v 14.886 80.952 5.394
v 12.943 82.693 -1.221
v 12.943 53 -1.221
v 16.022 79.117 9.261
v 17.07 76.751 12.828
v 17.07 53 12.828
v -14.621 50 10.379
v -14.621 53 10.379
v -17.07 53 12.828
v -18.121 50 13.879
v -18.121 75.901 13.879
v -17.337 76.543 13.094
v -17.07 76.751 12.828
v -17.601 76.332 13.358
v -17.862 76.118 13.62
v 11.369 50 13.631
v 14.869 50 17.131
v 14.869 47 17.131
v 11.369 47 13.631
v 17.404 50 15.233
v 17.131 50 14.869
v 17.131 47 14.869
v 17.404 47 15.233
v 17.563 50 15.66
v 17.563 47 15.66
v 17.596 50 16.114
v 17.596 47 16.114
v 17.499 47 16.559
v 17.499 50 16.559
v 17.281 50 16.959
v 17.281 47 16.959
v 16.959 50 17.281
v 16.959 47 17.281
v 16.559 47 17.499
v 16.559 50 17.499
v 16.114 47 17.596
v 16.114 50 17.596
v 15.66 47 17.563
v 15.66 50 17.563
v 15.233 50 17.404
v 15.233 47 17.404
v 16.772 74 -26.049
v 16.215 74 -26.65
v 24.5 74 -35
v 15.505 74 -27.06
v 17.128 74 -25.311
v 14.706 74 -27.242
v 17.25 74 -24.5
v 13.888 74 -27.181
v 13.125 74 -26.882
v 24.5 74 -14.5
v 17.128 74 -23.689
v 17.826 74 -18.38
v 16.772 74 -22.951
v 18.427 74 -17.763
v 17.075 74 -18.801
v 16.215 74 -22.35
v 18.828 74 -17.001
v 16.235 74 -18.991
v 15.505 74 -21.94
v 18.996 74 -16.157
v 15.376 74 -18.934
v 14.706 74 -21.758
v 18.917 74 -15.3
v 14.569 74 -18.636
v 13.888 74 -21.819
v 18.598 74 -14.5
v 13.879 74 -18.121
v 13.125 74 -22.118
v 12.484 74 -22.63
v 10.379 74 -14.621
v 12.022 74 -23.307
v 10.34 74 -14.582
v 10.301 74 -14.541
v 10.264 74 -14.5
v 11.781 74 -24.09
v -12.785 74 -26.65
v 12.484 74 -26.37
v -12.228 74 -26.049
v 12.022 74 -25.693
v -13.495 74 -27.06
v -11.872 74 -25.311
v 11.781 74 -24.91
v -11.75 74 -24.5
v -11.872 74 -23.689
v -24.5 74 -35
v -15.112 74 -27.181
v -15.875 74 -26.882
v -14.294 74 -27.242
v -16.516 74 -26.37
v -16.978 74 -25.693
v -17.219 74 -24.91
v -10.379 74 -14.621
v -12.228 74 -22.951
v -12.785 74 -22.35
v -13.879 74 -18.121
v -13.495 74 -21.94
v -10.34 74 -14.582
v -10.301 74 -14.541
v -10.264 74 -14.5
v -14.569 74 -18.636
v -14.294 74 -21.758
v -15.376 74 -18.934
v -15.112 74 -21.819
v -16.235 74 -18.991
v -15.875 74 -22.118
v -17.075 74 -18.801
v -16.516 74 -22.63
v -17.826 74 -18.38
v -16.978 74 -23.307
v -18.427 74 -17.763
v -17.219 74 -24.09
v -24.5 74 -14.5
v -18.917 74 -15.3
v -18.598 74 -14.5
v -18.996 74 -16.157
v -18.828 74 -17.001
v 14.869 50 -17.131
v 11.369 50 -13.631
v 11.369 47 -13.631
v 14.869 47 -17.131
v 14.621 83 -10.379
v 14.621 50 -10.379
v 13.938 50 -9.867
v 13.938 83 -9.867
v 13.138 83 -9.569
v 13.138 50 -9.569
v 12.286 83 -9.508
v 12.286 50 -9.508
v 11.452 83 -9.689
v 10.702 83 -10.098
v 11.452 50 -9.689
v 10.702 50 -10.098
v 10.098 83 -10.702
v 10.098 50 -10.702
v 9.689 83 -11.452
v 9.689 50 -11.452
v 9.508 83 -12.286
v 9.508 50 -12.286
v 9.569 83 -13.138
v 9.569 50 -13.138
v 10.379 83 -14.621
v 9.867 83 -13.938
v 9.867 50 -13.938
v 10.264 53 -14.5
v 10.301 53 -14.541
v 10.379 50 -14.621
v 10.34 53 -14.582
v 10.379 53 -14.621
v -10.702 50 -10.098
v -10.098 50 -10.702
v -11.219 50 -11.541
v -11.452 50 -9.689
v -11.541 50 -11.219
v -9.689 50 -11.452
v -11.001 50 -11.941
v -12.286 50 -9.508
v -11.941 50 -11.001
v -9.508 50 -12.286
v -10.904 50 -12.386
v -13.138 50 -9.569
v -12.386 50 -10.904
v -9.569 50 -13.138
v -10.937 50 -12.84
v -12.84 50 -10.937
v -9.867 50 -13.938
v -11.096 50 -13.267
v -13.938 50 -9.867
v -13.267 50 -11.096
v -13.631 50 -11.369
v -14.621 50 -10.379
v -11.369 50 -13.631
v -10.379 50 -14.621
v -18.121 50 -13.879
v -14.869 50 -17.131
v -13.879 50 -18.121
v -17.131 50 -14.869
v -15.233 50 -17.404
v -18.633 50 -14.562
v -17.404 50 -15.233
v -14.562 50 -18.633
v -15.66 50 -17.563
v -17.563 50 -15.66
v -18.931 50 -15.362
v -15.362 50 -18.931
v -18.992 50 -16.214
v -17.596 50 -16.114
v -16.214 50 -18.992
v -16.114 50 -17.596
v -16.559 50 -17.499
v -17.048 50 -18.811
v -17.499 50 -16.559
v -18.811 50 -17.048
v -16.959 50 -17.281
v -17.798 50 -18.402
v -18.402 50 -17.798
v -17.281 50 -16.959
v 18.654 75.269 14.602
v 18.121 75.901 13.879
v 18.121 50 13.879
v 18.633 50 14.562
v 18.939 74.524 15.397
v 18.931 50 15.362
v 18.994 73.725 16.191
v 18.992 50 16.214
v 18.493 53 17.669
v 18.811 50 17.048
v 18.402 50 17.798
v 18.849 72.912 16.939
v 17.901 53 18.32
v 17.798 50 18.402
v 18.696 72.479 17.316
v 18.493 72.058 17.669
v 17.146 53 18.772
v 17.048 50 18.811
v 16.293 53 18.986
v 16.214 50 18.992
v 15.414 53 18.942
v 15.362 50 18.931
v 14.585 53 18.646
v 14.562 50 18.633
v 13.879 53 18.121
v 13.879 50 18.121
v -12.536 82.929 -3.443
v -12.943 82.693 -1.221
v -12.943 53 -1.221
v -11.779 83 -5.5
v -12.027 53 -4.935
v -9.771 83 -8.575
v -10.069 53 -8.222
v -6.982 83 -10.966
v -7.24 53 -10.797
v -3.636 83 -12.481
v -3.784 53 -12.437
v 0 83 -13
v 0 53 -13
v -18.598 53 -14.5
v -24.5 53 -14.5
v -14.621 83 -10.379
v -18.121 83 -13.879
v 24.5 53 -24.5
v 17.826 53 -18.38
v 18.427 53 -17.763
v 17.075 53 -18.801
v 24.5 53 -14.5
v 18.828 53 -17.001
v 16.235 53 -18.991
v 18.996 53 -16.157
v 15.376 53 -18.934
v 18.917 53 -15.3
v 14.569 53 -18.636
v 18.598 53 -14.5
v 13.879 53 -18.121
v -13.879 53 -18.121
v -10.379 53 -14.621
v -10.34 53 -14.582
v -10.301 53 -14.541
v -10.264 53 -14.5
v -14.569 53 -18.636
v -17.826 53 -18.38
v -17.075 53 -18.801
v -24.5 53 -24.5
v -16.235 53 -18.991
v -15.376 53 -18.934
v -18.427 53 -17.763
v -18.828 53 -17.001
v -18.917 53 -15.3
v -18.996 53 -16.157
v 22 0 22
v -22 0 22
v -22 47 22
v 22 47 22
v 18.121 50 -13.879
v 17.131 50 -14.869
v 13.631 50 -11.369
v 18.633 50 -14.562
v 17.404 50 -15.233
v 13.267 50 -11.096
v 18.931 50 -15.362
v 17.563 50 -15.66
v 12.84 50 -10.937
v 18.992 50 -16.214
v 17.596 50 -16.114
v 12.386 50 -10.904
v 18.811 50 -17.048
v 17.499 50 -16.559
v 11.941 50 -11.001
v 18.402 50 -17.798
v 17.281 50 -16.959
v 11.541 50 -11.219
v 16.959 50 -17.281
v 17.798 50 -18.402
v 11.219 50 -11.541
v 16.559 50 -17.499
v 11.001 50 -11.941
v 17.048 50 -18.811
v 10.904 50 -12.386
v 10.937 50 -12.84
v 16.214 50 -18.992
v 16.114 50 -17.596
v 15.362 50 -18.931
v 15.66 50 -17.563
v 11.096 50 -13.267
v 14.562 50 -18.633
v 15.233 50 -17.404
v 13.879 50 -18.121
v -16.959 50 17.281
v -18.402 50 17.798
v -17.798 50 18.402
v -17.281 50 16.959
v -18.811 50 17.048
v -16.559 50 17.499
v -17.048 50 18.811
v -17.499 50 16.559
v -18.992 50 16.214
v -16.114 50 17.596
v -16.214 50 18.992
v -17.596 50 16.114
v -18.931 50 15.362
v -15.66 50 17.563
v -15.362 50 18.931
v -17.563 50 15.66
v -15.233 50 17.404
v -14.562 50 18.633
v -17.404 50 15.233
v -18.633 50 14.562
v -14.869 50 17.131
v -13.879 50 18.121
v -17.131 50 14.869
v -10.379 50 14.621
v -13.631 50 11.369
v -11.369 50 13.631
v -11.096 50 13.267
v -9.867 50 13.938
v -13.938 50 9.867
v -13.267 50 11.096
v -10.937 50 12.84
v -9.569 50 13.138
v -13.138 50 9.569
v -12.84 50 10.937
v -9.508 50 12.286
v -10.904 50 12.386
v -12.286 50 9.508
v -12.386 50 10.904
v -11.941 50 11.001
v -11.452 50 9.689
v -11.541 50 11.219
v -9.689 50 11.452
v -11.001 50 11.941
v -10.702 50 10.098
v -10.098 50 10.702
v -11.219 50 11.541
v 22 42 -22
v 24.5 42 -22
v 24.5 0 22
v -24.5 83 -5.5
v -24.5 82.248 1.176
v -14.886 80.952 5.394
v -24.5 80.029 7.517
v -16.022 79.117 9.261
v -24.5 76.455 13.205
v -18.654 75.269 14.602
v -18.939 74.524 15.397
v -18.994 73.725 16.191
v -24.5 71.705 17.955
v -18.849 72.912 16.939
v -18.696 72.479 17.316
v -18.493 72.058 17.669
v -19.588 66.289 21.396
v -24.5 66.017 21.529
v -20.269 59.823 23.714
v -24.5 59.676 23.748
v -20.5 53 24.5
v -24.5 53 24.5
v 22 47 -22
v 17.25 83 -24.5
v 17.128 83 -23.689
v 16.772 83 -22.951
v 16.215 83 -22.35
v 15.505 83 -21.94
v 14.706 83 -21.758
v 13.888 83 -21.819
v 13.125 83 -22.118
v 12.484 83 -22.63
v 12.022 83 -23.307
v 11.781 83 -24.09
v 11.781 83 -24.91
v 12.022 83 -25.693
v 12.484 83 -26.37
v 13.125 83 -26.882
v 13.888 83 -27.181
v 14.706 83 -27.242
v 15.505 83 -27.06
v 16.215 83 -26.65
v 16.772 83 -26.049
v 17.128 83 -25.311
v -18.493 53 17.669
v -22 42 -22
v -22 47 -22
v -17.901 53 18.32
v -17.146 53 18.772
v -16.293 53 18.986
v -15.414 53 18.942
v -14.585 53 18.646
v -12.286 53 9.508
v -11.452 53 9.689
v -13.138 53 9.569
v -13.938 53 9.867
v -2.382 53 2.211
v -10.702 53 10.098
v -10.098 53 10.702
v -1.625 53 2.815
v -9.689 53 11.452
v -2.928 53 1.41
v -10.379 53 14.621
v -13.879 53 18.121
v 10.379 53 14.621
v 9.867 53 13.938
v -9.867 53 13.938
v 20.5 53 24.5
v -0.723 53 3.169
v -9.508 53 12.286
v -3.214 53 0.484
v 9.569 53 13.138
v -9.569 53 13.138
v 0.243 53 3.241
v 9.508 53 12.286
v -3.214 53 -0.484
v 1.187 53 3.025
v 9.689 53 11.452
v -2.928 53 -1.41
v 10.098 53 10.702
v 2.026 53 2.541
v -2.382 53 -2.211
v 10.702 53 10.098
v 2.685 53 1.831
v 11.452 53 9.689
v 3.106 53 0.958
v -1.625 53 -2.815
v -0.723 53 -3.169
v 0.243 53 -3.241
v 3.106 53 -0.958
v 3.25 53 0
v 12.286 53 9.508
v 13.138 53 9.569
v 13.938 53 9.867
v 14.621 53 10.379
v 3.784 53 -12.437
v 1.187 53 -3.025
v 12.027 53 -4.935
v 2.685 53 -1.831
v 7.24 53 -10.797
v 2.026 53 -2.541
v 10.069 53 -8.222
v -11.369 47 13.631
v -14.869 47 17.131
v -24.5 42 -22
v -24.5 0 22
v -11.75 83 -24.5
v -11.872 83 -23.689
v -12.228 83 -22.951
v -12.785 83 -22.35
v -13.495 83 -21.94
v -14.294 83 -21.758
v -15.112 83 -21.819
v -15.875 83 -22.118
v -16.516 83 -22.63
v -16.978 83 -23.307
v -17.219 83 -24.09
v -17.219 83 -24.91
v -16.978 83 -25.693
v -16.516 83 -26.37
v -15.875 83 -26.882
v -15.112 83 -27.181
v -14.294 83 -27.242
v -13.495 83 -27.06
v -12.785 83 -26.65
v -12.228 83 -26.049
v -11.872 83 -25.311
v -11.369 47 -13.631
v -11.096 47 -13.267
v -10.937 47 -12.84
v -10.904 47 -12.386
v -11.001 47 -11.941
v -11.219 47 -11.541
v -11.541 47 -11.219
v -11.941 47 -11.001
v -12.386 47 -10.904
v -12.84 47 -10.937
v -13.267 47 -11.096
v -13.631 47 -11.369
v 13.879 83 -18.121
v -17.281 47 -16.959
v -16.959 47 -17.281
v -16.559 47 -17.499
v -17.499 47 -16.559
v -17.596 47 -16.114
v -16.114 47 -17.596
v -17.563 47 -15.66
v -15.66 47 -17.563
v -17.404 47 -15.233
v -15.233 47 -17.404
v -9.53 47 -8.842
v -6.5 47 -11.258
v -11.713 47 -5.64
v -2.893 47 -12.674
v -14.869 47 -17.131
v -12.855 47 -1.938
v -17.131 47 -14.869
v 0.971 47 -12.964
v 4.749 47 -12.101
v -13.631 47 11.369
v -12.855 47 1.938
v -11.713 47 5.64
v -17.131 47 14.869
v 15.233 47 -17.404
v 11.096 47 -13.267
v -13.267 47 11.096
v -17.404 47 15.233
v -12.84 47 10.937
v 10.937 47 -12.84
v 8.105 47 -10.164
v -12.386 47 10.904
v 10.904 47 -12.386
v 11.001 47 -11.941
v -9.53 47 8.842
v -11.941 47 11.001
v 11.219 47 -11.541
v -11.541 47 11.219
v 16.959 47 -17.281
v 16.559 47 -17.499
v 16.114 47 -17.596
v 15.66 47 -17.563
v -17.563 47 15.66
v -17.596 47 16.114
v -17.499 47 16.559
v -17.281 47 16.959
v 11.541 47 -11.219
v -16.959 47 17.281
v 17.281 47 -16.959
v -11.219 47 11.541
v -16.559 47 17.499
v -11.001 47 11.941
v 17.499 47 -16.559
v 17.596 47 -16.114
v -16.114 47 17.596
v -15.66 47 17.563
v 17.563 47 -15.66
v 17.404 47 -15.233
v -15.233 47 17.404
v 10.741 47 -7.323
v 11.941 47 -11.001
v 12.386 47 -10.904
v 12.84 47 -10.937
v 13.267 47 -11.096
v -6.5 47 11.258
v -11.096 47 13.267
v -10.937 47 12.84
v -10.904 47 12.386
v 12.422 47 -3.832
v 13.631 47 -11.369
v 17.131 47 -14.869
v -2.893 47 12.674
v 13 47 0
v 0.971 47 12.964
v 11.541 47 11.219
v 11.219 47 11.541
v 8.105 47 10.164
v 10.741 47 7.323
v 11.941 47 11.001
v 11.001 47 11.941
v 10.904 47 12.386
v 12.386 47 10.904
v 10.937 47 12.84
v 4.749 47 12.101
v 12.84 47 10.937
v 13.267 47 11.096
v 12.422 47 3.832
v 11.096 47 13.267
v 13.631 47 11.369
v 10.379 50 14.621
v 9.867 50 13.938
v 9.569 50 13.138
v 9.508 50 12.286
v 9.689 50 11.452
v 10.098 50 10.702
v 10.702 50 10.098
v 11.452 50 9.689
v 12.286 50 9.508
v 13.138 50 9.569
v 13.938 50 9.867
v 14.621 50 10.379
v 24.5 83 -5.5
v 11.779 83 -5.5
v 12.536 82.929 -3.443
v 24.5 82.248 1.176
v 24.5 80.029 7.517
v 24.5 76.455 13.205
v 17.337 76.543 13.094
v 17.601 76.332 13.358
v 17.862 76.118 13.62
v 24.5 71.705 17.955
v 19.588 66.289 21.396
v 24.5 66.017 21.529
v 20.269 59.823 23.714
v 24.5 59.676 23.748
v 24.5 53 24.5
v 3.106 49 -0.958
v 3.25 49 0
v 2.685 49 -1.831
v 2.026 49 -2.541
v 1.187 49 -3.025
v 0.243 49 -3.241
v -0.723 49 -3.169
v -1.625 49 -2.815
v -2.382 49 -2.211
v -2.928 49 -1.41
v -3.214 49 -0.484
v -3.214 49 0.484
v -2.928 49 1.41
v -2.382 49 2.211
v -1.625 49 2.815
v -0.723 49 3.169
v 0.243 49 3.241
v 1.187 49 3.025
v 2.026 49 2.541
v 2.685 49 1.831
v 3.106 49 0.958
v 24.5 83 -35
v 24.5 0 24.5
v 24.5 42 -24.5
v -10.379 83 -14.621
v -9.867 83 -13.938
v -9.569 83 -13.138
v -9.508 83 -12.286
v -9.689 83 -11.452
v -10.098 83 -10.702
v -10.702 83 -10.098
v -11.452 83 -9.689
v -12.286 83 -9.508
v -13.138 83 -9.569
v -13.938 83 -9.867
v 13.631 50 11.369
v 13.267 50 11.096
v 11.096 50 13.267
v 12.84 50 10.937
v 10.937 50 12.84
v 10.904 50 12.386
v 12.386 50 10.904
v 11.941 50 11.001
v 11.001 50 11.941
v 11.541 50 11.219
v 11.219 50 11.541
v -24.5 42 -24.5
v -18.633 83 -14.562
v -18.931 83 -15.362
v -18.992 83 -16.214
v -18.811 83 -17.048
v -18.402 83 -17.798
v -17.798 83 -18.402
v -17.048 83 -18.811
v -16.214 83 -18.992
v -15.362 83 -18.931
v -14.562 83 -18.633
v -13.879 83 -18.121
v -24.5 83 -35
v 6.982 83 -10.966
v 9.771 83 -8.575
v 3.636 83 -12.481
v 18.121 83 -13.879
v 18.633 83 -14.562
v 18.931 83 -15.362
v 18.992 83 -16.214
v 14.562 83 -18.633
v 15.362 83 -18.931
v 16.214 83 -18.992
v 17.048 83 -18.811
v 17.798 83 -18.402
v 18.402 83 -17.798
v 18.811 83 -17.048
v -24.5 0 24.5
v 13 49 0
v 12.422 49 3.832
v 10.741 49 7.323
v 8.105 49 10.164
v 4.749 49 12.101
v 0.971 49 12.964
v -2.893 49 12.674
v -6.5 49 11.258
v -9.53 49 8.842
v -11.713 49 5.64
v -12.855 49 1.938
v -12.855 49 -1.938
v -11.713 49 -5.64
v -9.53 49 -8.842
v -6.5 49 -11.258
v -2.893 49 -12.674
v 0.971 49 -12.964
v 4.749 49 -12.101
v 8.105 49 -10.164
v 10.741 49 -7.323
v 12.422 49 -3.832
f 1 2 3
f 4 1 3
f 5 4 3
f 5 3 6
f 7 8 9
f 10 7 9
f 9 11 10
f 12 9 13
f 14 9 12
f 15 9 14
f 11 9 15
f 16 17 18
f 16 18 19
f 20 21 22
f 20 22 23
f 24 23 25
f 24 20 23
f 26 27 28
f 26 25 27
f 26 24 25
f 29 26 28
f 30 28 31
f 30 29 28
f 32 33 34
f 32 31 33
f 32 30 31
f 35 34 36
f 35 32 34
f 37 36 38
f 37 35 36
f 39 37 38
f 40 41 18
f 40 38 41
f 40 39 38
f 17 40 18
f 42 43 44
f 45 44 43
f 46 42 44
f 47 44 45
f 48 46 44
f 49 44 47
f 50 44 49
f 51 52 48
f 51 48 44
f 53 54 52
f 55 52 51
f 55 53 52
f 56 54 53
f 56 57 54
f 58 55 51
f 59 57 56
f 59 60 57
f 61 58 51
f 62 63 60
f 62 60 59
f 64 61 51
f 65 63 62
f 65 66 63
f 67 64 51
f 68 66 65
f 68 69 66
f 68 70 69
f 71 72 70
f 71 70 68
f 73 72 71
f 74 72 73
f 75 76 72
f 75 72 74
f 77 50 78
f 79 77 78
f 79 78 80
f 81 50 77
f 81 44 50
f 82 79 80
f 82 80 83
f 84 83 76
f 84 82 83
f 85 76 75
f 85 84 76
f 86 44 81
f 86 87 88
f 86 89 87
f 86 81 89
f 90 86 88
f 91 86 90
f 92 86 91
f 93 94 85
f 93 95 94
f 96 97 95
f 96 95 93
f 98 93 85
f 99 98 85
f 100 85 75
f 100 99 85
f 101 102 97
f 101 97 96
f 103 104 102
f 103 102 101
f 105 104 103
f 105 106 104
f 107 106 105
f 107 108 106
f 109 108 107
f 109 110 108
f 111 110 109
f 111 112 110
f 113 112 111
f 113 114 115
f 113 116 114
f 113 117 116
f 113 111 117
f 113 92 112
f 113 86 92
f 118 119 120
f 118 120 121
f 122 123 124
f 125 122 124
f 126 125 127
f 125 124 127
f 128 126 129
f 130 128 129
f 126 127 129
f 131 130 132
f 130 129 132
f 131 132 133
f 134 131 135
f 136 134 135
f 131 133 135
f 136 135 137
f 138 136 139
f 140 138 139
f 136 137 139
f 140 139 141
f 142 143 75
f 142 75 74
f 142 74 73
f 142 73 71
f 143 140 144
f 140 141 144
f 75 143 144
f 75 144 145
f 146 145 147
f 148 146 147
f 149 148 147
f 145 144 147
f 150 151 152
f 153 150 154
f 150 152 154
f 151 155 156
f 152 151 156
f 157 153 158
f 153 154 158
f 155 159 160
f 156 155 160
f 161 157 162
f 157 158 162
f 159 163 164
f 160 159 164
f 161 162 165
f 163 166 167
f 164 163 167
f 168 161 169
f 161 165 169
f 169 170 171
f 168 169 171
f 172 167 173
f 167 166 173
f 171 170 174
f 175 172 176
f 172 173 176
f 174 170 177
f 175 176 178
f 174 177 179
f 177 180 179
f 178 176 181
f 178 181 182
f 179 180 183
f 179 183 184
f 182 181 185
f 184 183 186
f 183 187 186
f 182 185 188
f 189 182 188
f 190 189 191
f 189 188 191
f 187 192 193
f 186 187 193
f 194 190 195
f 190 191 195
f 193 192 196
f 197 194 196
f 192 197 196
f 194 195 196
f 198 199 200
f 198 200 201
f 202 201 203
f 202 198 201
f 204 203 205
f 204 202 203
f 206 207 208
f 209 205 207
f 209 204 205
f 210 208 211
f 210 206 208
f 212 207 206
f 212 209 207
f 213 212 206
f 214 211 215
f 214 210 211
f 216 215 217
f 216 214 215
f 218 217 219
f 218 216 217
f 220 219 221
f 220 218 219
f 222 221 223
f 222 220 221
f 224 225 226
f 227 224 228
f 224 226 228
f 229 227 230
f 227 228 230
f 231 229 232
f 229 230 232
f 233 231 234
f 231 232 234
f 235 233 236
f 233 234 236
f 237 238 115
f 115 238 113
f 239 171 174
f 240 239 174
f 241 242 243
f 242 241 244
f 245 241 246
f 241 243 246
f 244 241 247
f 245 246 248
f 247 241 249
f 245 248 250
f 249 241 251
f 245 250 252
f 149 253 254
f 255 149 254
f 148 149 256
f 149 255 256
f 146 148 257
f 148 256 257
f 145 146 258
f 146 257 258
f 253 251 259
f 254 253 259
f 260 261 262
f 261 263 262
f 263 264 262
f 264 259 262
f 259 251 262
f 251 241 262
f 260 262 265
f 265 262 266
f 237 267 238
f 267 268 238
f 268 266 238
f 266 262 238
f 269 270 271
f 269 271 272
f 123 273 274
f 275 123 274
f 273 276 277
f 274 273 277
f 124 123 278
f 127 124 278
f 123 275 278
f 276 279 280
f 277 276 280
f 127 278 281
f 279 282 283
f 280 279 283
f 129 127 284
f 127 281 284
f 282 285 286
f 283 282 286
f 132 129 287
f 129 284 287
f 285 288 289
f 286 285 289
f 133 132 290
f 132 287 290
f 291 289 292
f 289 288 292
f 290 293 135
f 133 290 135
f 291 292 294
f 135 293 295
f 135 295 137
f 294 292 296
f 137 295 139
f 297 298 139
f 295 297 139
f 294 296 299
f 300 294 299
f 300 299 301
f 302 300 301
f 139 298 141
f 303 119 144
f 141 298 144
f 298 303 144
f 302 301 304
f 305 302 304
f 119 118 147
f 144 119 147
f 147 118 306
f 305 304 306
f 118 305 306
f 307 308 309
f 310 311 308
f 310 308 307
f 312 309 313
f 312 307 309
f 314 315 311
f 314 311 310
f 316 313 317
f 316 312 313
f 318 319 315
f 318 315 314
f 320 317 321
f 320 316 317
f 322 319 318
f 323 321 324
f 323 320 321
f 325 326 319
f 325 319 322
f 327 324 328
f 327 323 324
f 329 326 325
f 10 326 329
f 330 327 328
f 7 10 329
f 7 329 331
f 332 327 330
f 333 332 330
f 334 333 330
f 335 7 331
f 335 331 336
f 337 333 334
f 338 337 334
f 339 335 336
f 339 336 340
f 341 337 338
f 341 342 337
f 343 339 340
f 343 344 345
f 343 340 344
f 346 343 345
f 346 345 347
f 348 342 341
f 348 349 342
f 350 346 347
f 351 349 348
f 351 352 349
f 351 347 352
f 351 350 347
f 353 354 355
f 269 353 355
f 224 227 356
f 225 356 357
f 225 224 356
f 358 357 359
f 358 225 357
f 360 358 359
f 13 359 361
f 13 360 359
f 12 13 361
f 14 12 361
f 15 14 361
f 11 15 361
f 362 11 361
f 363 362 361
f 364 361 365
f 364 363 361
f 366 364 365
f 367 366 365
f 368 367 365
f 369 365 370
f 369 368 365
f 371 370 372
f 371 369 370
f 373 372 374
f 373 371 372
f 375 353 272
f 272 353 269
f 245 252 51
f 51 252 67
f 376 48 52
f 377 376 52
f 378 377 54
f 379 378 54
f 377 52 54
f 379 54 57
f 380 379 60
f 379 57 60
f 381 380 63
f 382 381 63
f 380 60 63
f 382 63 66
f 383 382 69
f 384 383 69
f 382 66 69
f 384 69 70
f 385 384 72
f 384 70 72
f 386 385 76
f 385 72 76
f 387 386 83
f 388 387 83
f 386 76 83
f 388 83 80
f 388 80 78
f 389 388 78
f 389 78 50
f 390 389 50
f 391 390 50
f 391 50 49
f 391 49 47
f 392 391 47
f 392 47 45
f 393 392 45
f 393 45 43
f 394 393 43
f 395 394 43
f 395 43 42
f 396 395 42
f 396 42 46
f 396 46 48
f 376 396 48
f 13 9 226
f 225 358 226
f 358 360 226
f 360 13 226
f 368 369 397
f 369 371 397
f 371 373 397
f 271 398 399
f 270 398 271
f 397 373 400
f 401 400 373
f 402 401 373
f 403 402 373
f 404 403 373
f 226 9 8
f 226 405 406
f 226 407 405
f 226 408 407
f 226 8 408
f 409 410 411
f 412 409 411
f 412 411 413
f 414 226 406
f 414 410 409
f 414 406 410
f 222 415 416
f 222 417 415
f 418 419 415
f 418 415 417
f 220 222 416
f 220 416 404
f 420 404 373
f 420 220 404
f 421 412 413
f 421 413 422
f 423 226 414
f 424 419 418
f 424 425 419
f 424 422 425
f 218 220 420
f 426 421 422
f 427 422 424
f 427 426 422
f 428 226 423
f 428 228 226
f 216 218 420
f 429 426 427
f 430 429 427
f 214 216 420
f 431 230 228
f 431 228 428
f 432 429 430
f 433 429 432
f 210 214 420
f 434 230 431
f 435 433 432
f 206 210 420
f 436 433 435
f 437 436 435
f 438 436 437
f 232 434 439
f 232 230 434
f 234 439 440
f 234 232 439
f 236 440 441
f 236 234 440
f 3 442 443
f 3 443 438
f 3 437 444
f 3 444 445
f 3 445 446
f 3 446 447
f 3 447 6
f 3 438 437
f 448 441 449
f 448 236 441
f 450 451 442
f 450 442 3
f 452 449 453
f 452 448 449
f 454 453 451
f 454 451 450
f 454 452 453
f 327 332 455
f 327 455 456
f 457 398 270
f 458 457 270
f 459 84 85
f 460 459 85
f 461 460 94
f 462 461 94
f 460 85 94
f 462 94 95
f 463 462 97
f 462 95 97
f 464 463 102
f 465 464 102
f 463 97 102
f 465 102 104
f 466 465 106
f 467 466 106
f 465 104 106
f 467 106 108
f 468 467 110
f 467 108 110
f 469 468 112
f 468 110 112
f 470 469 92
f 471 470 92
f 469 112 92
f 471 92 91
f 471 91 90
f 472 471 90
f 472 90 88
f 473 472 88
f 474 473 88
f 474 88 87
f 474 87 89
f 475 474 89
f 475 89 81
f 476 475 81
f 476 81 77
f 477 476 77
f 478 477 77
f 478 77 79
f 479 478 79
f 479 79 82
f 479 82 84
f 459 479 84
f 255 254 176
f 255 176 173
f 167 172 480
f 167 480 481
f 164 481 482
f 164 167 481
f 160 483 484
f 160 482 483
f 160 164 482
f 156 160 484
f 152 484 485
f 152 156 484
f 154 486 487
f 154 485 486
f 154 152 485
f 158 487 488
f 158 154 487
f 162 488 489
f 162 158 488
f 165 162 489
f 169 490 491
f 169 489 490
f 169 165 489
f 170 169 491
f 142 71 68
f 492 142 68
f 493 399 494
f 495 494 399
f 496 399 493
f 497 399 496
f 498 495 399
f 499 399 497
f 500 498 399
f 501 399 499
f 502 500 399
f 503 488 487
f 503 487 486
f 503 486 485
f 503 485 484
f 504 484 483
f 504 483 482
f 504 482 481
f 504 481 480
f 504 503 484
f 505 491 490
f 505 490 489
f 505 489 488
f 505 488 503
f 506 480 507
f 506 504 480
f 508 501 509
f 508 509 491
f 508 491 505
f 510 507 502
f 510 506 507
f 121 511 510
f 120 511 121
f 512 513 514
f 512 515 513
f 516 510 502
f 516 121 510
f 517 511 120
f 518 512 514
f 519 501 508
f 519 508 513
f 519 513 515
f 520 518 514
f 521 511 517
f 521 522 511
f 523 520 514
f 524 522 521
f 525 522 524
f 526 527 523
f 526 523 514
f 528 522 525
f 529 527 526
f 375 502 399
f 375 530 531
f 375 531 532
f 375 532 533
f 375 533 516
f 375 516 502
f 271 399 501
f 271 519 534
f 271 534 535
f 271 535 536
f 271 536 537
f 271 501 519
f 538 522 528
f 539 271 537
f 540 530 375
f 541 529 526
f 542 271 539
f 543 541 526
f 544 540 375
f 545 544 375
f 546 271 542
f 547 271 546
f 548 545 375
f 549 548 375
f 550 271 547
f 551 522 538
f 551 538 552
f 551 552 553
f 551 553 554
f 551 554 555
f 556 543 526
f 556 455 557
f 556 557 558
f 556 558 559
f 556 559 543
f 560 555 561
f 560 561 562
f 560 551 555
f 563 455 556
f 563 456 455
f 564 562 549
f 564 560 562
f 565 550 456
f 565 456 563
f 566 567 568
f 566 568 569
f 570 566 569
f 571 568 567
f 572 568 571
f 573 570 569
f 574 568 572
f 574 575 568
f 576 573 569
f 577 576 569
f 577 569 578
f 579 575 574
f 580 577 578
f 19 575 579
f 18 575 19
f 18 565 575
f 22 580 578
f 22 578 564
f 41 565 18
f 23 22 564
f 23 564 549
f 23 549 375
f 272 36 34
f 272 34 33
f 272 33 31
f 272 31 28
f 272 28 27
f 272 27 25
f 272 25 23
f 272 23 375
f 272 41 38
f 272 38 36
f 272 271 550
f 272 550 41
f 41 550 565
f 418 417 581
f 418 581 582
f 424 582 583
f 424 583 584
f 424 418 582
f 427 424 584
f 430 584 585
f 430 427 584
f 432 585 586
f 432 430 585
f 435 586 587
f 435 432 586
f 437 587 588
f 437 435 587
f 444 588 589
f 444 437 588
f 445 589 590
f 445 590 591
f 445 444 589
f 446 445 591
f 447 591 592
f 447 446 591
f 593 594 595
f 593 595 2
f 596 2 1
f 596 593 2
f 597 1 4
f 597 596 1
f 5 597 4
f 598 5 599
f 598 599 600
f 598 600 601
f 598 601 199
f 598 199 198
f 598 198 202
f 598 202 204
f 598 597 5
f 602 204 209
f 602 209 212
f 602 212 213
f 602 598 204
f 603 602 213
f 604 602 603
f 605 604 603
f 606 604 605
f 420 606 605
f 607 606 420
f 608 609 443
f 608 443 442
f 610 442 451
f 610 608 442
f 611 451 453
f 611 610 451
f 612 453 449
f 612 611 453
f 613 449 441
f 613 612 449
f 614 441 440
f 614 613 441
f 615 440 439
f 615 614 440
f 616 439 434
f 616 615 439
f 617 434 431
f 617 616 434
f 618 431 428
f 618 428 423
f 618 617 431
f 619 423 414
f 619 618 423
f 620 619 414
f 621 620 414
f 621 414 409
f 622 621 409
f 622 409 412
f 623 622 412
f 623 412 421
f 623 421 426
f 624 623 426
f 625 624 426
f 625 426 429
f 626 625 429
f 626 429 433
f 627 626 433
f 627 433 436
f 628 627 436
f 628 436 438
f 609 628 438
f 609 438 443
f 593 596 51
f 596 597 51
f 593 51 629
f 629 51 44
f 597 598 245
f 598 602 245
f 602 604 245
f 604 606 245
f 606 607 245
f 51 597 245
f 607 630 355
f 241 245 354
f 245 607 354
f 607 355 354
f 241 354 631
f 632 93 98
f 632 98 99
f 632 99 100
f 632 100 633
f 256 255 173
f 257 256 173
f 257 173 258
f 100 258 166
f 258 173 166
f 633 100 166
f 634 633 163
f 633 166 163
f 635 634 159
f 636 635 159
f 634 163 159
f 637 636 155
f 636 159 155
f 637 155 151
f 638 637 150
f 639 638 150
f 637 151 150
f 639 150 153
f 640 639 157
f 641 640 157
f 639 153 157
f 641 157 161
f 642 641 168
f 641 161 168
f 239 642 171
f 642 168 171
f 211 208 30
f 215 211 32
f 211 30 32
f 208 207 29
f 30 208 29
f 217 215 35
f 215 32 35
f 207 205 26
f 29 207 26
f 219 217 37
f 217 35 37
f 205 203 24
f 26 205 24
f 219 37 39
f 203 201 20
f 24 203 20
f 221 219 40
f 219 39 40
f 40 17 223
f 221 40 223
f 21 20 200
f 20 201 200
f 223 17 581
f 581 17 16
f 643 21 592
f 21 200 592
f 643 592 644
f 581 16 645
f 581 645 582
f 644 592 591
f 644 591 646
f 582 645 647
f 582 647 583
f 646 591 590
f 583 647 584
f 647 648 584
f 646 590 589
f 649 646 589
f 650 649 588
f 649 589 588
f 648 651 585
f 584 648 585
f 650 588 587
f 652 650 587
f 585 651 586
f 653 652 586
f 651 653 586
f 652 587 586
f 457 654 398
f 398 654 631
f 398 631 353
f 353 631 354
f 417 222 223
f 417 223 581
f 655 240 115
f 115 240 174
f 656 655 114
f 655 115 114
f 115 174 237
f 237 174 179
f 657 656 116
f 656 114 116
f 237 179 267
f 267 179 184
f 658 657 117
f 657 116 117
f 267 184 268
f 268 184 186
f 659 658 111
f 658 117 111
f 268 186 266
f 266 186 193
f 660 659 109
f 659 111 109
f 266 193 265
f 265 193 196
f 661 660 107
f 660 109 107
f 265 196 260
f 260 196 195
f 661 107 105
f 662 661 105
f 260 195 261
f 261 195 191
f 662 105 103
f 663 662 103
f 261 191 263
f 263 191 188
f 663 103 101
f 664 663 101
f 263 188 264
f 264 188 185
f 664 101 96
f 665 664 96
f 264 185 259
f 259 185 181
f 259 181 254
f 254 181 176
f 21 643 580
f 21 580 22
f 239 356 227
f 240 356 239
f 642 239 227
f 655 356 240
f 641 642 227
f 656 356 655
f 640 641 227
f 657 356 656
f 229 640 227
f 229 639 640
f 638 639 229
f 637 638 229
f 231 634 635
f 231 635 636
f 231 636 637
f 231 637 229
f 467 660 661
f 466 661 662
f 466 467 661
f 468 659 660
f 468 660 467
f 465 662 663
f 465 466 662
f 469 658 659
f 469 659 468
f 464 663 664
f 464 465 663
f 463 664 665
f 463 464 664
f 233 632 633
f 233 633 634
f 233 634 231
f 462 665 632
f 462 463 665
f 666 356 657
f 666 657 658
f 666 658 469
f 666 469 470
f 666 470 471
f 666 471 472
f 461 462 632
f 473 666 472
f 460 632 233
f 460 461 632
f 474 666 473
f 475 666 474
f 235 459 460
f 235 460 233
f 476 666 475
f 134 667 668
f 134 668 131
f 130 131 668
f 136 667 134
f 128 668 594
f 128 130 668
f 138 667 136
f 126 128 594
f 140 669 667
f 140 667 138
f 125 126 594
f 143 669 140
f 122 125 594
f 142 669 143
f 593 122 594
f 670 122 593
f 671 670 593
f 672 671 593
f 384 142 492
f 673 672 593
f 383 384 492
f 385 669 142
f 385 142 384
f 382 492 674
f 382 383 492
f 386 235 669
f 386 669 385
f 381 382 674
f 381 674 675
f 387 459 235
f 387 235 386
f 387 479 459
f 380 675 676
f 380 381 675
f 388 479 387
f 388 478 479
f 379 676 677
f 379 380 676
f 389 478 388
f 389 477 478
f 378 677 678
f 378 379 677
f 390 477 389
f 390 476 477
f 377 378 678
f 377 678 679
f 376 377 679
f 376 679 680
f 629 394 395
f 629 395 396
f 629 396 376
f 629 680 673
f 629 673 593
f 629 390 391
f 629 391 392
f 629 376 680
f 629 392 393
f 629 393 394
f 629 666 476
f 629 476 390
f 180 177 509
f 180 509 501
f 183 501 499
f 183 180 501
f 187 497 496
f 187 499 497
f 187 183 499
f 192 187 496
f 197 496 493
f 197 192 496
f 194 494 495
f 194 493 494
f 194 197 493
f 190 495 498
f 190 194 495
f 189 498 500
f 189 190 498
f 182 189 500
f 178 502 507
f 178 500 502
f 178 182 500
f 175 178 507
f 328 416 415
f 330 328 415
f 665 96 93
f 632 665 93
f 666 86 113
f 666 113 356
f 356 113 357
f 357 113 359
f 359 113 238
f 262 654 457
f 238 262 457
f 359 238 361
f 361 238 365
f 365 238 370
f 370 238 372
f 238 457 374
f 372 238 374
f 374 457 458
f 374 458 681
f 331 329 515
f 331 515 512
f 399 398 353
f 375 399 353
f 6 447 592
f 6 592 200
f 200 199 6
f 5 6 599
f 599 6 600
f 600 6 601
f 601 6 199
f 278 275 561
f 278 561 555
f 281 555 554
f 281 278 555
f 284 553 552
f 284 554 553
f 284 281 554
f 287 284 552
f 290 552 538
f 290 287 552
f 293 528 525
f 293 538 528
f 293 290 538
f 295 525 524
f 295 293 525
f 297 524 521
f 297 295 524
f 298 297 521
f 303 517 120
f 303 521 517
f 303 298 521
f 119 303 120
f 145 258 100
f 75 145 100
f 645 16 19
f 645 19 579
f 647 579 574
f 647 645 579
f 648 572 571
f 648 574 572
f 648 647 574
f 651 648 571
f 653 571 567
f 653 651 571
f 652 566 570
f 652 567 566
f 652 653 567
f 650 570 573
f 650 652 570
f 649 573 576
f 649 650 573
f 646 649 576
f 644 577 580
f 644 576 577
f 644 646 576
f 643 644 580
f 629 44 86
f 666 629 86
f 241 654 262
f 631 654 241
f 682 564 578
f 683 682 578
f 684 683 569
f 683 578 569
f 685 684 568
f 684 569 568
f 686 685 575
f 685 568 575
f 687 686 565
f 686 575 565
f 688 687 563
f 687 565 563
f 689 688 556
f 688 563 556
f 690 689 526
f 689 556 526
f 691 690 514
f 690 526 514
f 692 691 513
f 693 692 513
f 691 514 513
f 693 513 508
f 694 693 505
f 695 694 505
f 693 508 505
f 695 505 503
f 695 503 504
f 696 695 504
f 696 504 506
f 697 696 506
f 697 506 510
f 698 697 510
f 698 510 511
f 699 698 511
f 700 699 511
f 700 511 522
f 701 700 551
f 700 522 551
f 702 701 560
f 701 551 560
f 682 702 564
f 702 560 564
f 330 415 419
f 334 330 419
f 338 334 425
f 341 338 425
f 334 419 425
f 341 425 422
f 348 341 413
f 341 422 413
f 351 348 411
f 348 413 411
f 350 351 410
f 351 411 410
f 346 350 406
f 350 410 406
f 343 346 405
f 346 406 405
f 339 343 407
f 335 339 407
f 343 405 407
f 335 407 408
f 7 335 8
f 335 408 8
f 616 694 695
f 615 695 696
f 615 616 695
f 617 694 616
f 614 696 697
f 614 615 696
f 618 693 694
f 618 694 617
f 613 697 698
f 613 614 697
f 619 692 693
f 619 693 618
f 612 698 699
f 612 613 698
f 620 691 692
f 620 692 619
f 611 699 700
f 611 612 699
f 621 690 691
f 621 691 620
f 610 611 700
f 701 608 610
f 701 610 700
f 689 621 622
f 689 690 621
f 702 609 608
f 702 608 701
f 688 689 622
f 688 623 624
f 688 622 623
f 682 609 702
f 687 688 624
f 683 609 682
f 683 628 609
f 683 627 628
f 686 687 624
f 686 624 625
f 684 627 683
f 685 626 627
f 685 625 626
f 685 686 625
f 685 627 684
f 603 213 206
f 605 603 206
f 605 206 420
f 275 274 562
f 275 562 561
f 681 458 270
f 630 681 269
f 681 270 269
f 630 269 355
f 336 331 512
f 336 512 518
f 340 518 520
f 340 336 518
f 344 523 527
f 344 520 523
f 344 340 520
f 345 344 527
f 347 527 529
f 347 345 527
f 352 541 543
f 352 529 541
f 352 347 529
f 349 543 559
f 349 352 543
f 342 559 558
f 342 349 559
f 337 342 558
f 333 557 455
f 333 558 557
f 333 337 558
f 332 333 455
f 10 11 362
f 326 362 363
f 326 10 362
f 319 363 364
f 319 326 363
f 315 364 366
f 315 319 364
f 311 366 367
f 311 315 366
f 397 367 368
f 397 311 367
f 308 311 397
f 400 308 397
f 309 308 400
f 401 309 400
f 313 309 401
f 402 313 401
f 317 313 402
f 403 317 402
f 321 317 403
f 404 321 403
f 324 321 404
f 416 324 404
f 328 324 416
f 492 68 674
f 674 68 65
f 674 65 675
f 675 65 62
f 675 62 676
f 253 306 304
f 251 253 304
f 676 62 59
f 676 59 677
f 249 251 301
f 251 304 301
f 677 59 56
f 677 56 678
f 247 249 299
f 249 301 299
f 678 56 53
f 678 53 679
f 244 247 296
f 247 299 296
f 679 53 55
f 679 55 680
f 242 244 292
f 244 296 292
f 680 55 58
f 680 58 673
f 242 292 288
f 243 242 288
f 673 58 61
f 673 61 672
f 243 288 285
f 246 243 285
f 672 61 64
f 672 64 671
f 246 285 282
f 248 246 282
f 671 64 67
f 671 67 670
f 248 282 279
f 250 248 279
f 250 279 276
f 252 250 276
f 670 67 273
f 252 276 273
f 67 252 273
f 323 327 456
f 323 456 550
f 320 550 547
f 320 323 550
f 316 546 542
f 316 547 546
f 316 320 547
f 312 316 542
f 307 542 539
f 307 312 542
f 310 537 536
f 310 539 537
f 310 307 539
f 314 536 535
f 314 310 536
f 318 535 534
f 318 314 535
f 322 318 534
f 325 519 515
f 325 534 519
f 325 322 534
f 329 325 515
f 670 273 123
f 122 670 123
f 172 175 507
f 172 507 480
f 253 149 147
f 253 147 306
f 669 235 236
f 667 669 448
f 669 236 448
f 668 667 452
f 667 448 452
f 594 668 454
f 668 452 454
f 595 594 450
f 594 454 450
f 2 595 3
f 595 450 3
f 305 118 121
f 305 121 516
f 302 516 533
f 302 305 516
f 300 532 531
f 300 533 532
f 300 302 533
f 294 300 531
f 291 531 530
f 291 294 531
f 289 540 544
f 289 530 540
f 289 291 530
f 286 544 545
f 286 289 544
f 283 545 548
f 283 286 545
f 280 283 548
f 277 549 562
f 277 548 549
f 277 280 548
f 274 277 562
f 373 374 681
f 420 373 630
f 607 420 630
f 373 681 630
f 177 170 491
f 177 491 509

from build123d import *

# Parameters (mm, degrees)
SKETCH1_W               = 49
SKETCH1_H               = 49
SKETCH1_R               = 3.25
BOSS_EXTRUDE1_DEPTH     = 53
SKETCH2_W               = 44
SKETCH2_H               = 44
CUT_EXTRUDE1_DEPTH      = 47
SKETCH3_R               = 13
CUT_EXTRUDE2_DEPTH      = 2
CUT_EXTRUDE3_DEPTH      = 10
BOSS_EXTRUDE2_DEPTH     = 30
SKETCH7_W               = 20.5
SKETCH7_H               = 21
CUT_EXTRUDE6_DEPTH      = 59
CUT_EXTRUDE7_DEPTH      = 59
CUT_EXTRUDE7_DEPTH_BACK = 3
SKETCH10_R              = 2.75
CUT_EXTRUDE8_DEPTH      = 59
FILLET1_R               = 30
CUT_EXTRUDE9_DEPTH      = 50.0000001


with BuildPart() as part:
    # Sketch1 → Boss-Extrude1 (new body)
    with BuildSketch(Plane(origin=(0, 0, 0), x_dir=(1, 0, 0), z_dir=(0, 1, 0))):
        Rectangle(SKETCH1_W, SKETCH1_H)
        Circle(SKETCH1_R, mode=Mode.SUBTRACT)
    extrude(amount=BOSS_EXTRUDE1_DEPTH)

    # Sketch2 → Cut-Extrude1 (cut)
    with BuildSketch(Plane.XZ):
        Rectangle(SKETCH2_W, SKETCH2_H)
    extrude(amount=-CUT_EXTRUDE1_DEPTH, mode=Mode.SUBTRACT)

    # Sketch3 → Cut-Extrude2 (cut)
    with BuildSketch(Plane.XZ.offset(-47)):
        Circle(SKETCH3_R)
    extrude(amount=-CUT_EXTRUDE2_DEPTH, mode=Mode.SUBTRACT)

    # Sketch4 → Cut-Extrude3 (cut)
    with BuildSketch(Plane(origin=(0, 53, 0), x_dir=(1, 0, 0), z_dir=(0, 1, 0))):
        with BuildLine():
            Line((-14.86862915, 17.13137085), (-11.36862915, 13.63137085))
            ThreePointArc((-11.36862915, 13.63137085), (-11.36862915, 11.36862915), (-13.63137085, 11.36862915))
            Line((-13.63137085, 11.36862915), (-17.13137085, 14.86862915))
            ThreePointArc((-17.13137085, 14.86862915), (-17.13137085, 17.13137085), (-14.86862915, 17.13137085))
        make_face()
        with BuildLine():
            Line((11.36862915, 13.63137085), (14.86862915, 17.13137085))
            ThreePointArc((14.86862915, 17.13137085), (17.13137085, 17.13137085), (17.13137085, 14.86862915))
            Line((17.13137085, 14.86862915), (13.63137085, 11.36862915))
            ThreePointArc((13.63137085, 11.36862915), (11.36862915, 11.36862915), (11.36862915, 13.63137085))
        make_face()
        with BuildLine():
            Line((13.63137085, -11.36862915), (17.13137085, -14.86862915))
            ThreePointArc((17.13137085, -14.86862915), (17.13137085, -17.13137085), (14.86862915, -17.13137085))
            Line((14.86862915, -17.13137085), (11.36862915, -13.63137085))
            ThreePointArc((11.36862915, -13.63137085), (11.36862915, -11.36862915), (13.63137085, -11.36862915))
        make_face()
        with BuildLine():
            Line((-11.36862915, -13.63137085), (-14.86862915, -17.13137085))
            ThreePointArc((-14.86862915, -17.13137085), (-17.13137085, -17.13137085), (-17.13137085, -14.86862915))
            Line((-17.13137085, -14.86862915), (-13.63137085, -11.36862915))
            ThreePointArc((-13.63137085, -11.36862915), (-11.36862915, -11.36862915), (-11.36862915, -13.63137085))
        make_face()
    extrude(amount=-CUT_EXTRUDE3_DEPTH, mode=Mode.SUBTRACT)

    # Sketch5 → Boss-Extrude2 (add)
    with BuildSketch(Plane(origin=(0, 53, 0), x_dir=(1, 0, 0), z_dir=(0, 1, 0))):
        with BuildLine():
            Line((-20.5, -24.5), (-12.942531675, 1.221013453))
            ThreePointArc((-12.942531675, 1.221013453), (-8.750052146, 9.614394804), (0, 13))
            ThreePointArc((0, 13), (8.750052146, 9.614394804), (12.942531675, 1.221013453))
            Line((12.942531675, 1.221013453), (20.5, -24.5))
            Line((20.5, -24.5), (24.5, -24.5))
            Line((24.5, -24.5), (24.5, 35))
            Line((24.5, 35), (-24.5, 35))
            Line((-24.5, 35), (-24.5, -24.5))
            Line((-24.5, -24.5), (-20.5, -24.5))
        make_face()
    extrude(amount=BOSS_EXTRUDE2_DEPTH)

    # Sketch7 → Cut-Extrude6 (cut)
    with BuildSketch(Plane.ZY.offset(24.5)):
        with Locations((-24.75, 63.5)):
            Rectangle(SKETCH7_W, SKETCH7_H)
    extrude(amount=-CUT_EXTRUDE6_DEPTH, mode=Mode.SUBTRACT)

    # Sketch9 → Cut-Extrude7 (cut, two sides)
    with BuildSketch(Plane(origin=(0, 53, 0), x_dir=(1, 0, 0), z_dir=(0, 1, 0))) as cut_extrude7_sk:
        with BuildLine():
            Line((-14.621320344, 10.378679656), (-18.121320344, 13.878679656))
            ThreePointArc((-18.121320344, 13.878679656), (-18.121320344, 18.121320344), (-13.878679656, 18.121320344))
            Line((-13.878679656, 18.121320344), (-10.378679656, 14.621320344))
            ThreePointArc((-10.378679656, 14.621320344), (-10.378679656, 10.378679656), (-14.621320344, 10.378679656))
        make_face()
        with BuildLine():
            Line((10.378679656, 14.621320344), (13.878679656, 18.121320344))
            ThreePointArc((13.878679656, 18.121320344), (18.121320344, 18.121320344), (18.121320344, 13.878679656))
            Line((18.121320344, 13.878679656), (14.621320344, 10.378679656))
            ThreePointArc((14.621320344, 10.378679656), (10.378679656, 10.378679656), (10.378679656, 14.621320344))
        make_face()
        with BuildLine():
            Line((13.878679656, -18.121320344), (10.378679656, -14.621320344))
            ThreePointArc((10.378679656, -14.621320344), (10.378679656, -10.378679656), (14.621320344, -10.378679656))
            Line((14.621320344, -10.378679656), (18.121320344, -13.878679656))
            ThreePointArc((18.121320344, -13.878679656), (18.121320344, -18.121320344), (13.878679656, -18.121320344))
        make_face()
        with BuildLine():
            Line((-13.878679656, -18.121320344), (-10.378679656, -14.621320344))
            ThreePointArc((-10.378679656, -14.621320344), (-10.378679656, -10.378679656), (-14.621320344, -10.378679656))
            Line((-14.621320344, -10.378679656), (-18.121320344, -13.878679656))
            ThreePointArc((-18.121320344, -13.878679656), (-18.121320344, -18.121320344), (-13.878679656, -18.121320344))
        make_face()
    extrude(amount=CUT_EXTRUDE7_DEPTH, mode=Mode.SUBTRACT)
    extrude(cut_extrude7_sk.sketch, amount=-CUT_EXTRUDE7_DEPTH_BACK, mode=Mode.SUBTRACT)

    # Sketch10 → Cut-Extrude8 (cut)
    with BuildSketch(Plane.XZ.offset(-74)):
        with Locations((14.5, -24.5)):
            Circle(SKETCH10_R)
        with Locations((-14.5, -24.5)):
            Circle(SKETCH10_R)
    extrude(amount=-CUT_EXTRUDE8_DEPTH, mode=Mode.SUBTRACT)

    # Fillet1
    fillet1_edges = [part.edges().sort_by_distance(p)[0] for p in [
        (22.5, 83, 24.5),
        (-22.5, 83, 24.5),
    ]]
    fillet(fillet1_edges, radius=FILLET1_R)

    # Sketch11 → Cut-Extrude9 (cut, through all)
    with BuildSketch(Plane(origin=(24.5, 0, 0), x_dir=(0, 0, -1), z_dir=(1, 0, 0))):
        Polygon((24.5, 0), (24.5, 42), (22, 42), (-22, 0), align=None)
    extrude(amount=-CUT_EXTRUDE9_DEPTH, mode=Mode.SUBTRACT)


solid = part.part
